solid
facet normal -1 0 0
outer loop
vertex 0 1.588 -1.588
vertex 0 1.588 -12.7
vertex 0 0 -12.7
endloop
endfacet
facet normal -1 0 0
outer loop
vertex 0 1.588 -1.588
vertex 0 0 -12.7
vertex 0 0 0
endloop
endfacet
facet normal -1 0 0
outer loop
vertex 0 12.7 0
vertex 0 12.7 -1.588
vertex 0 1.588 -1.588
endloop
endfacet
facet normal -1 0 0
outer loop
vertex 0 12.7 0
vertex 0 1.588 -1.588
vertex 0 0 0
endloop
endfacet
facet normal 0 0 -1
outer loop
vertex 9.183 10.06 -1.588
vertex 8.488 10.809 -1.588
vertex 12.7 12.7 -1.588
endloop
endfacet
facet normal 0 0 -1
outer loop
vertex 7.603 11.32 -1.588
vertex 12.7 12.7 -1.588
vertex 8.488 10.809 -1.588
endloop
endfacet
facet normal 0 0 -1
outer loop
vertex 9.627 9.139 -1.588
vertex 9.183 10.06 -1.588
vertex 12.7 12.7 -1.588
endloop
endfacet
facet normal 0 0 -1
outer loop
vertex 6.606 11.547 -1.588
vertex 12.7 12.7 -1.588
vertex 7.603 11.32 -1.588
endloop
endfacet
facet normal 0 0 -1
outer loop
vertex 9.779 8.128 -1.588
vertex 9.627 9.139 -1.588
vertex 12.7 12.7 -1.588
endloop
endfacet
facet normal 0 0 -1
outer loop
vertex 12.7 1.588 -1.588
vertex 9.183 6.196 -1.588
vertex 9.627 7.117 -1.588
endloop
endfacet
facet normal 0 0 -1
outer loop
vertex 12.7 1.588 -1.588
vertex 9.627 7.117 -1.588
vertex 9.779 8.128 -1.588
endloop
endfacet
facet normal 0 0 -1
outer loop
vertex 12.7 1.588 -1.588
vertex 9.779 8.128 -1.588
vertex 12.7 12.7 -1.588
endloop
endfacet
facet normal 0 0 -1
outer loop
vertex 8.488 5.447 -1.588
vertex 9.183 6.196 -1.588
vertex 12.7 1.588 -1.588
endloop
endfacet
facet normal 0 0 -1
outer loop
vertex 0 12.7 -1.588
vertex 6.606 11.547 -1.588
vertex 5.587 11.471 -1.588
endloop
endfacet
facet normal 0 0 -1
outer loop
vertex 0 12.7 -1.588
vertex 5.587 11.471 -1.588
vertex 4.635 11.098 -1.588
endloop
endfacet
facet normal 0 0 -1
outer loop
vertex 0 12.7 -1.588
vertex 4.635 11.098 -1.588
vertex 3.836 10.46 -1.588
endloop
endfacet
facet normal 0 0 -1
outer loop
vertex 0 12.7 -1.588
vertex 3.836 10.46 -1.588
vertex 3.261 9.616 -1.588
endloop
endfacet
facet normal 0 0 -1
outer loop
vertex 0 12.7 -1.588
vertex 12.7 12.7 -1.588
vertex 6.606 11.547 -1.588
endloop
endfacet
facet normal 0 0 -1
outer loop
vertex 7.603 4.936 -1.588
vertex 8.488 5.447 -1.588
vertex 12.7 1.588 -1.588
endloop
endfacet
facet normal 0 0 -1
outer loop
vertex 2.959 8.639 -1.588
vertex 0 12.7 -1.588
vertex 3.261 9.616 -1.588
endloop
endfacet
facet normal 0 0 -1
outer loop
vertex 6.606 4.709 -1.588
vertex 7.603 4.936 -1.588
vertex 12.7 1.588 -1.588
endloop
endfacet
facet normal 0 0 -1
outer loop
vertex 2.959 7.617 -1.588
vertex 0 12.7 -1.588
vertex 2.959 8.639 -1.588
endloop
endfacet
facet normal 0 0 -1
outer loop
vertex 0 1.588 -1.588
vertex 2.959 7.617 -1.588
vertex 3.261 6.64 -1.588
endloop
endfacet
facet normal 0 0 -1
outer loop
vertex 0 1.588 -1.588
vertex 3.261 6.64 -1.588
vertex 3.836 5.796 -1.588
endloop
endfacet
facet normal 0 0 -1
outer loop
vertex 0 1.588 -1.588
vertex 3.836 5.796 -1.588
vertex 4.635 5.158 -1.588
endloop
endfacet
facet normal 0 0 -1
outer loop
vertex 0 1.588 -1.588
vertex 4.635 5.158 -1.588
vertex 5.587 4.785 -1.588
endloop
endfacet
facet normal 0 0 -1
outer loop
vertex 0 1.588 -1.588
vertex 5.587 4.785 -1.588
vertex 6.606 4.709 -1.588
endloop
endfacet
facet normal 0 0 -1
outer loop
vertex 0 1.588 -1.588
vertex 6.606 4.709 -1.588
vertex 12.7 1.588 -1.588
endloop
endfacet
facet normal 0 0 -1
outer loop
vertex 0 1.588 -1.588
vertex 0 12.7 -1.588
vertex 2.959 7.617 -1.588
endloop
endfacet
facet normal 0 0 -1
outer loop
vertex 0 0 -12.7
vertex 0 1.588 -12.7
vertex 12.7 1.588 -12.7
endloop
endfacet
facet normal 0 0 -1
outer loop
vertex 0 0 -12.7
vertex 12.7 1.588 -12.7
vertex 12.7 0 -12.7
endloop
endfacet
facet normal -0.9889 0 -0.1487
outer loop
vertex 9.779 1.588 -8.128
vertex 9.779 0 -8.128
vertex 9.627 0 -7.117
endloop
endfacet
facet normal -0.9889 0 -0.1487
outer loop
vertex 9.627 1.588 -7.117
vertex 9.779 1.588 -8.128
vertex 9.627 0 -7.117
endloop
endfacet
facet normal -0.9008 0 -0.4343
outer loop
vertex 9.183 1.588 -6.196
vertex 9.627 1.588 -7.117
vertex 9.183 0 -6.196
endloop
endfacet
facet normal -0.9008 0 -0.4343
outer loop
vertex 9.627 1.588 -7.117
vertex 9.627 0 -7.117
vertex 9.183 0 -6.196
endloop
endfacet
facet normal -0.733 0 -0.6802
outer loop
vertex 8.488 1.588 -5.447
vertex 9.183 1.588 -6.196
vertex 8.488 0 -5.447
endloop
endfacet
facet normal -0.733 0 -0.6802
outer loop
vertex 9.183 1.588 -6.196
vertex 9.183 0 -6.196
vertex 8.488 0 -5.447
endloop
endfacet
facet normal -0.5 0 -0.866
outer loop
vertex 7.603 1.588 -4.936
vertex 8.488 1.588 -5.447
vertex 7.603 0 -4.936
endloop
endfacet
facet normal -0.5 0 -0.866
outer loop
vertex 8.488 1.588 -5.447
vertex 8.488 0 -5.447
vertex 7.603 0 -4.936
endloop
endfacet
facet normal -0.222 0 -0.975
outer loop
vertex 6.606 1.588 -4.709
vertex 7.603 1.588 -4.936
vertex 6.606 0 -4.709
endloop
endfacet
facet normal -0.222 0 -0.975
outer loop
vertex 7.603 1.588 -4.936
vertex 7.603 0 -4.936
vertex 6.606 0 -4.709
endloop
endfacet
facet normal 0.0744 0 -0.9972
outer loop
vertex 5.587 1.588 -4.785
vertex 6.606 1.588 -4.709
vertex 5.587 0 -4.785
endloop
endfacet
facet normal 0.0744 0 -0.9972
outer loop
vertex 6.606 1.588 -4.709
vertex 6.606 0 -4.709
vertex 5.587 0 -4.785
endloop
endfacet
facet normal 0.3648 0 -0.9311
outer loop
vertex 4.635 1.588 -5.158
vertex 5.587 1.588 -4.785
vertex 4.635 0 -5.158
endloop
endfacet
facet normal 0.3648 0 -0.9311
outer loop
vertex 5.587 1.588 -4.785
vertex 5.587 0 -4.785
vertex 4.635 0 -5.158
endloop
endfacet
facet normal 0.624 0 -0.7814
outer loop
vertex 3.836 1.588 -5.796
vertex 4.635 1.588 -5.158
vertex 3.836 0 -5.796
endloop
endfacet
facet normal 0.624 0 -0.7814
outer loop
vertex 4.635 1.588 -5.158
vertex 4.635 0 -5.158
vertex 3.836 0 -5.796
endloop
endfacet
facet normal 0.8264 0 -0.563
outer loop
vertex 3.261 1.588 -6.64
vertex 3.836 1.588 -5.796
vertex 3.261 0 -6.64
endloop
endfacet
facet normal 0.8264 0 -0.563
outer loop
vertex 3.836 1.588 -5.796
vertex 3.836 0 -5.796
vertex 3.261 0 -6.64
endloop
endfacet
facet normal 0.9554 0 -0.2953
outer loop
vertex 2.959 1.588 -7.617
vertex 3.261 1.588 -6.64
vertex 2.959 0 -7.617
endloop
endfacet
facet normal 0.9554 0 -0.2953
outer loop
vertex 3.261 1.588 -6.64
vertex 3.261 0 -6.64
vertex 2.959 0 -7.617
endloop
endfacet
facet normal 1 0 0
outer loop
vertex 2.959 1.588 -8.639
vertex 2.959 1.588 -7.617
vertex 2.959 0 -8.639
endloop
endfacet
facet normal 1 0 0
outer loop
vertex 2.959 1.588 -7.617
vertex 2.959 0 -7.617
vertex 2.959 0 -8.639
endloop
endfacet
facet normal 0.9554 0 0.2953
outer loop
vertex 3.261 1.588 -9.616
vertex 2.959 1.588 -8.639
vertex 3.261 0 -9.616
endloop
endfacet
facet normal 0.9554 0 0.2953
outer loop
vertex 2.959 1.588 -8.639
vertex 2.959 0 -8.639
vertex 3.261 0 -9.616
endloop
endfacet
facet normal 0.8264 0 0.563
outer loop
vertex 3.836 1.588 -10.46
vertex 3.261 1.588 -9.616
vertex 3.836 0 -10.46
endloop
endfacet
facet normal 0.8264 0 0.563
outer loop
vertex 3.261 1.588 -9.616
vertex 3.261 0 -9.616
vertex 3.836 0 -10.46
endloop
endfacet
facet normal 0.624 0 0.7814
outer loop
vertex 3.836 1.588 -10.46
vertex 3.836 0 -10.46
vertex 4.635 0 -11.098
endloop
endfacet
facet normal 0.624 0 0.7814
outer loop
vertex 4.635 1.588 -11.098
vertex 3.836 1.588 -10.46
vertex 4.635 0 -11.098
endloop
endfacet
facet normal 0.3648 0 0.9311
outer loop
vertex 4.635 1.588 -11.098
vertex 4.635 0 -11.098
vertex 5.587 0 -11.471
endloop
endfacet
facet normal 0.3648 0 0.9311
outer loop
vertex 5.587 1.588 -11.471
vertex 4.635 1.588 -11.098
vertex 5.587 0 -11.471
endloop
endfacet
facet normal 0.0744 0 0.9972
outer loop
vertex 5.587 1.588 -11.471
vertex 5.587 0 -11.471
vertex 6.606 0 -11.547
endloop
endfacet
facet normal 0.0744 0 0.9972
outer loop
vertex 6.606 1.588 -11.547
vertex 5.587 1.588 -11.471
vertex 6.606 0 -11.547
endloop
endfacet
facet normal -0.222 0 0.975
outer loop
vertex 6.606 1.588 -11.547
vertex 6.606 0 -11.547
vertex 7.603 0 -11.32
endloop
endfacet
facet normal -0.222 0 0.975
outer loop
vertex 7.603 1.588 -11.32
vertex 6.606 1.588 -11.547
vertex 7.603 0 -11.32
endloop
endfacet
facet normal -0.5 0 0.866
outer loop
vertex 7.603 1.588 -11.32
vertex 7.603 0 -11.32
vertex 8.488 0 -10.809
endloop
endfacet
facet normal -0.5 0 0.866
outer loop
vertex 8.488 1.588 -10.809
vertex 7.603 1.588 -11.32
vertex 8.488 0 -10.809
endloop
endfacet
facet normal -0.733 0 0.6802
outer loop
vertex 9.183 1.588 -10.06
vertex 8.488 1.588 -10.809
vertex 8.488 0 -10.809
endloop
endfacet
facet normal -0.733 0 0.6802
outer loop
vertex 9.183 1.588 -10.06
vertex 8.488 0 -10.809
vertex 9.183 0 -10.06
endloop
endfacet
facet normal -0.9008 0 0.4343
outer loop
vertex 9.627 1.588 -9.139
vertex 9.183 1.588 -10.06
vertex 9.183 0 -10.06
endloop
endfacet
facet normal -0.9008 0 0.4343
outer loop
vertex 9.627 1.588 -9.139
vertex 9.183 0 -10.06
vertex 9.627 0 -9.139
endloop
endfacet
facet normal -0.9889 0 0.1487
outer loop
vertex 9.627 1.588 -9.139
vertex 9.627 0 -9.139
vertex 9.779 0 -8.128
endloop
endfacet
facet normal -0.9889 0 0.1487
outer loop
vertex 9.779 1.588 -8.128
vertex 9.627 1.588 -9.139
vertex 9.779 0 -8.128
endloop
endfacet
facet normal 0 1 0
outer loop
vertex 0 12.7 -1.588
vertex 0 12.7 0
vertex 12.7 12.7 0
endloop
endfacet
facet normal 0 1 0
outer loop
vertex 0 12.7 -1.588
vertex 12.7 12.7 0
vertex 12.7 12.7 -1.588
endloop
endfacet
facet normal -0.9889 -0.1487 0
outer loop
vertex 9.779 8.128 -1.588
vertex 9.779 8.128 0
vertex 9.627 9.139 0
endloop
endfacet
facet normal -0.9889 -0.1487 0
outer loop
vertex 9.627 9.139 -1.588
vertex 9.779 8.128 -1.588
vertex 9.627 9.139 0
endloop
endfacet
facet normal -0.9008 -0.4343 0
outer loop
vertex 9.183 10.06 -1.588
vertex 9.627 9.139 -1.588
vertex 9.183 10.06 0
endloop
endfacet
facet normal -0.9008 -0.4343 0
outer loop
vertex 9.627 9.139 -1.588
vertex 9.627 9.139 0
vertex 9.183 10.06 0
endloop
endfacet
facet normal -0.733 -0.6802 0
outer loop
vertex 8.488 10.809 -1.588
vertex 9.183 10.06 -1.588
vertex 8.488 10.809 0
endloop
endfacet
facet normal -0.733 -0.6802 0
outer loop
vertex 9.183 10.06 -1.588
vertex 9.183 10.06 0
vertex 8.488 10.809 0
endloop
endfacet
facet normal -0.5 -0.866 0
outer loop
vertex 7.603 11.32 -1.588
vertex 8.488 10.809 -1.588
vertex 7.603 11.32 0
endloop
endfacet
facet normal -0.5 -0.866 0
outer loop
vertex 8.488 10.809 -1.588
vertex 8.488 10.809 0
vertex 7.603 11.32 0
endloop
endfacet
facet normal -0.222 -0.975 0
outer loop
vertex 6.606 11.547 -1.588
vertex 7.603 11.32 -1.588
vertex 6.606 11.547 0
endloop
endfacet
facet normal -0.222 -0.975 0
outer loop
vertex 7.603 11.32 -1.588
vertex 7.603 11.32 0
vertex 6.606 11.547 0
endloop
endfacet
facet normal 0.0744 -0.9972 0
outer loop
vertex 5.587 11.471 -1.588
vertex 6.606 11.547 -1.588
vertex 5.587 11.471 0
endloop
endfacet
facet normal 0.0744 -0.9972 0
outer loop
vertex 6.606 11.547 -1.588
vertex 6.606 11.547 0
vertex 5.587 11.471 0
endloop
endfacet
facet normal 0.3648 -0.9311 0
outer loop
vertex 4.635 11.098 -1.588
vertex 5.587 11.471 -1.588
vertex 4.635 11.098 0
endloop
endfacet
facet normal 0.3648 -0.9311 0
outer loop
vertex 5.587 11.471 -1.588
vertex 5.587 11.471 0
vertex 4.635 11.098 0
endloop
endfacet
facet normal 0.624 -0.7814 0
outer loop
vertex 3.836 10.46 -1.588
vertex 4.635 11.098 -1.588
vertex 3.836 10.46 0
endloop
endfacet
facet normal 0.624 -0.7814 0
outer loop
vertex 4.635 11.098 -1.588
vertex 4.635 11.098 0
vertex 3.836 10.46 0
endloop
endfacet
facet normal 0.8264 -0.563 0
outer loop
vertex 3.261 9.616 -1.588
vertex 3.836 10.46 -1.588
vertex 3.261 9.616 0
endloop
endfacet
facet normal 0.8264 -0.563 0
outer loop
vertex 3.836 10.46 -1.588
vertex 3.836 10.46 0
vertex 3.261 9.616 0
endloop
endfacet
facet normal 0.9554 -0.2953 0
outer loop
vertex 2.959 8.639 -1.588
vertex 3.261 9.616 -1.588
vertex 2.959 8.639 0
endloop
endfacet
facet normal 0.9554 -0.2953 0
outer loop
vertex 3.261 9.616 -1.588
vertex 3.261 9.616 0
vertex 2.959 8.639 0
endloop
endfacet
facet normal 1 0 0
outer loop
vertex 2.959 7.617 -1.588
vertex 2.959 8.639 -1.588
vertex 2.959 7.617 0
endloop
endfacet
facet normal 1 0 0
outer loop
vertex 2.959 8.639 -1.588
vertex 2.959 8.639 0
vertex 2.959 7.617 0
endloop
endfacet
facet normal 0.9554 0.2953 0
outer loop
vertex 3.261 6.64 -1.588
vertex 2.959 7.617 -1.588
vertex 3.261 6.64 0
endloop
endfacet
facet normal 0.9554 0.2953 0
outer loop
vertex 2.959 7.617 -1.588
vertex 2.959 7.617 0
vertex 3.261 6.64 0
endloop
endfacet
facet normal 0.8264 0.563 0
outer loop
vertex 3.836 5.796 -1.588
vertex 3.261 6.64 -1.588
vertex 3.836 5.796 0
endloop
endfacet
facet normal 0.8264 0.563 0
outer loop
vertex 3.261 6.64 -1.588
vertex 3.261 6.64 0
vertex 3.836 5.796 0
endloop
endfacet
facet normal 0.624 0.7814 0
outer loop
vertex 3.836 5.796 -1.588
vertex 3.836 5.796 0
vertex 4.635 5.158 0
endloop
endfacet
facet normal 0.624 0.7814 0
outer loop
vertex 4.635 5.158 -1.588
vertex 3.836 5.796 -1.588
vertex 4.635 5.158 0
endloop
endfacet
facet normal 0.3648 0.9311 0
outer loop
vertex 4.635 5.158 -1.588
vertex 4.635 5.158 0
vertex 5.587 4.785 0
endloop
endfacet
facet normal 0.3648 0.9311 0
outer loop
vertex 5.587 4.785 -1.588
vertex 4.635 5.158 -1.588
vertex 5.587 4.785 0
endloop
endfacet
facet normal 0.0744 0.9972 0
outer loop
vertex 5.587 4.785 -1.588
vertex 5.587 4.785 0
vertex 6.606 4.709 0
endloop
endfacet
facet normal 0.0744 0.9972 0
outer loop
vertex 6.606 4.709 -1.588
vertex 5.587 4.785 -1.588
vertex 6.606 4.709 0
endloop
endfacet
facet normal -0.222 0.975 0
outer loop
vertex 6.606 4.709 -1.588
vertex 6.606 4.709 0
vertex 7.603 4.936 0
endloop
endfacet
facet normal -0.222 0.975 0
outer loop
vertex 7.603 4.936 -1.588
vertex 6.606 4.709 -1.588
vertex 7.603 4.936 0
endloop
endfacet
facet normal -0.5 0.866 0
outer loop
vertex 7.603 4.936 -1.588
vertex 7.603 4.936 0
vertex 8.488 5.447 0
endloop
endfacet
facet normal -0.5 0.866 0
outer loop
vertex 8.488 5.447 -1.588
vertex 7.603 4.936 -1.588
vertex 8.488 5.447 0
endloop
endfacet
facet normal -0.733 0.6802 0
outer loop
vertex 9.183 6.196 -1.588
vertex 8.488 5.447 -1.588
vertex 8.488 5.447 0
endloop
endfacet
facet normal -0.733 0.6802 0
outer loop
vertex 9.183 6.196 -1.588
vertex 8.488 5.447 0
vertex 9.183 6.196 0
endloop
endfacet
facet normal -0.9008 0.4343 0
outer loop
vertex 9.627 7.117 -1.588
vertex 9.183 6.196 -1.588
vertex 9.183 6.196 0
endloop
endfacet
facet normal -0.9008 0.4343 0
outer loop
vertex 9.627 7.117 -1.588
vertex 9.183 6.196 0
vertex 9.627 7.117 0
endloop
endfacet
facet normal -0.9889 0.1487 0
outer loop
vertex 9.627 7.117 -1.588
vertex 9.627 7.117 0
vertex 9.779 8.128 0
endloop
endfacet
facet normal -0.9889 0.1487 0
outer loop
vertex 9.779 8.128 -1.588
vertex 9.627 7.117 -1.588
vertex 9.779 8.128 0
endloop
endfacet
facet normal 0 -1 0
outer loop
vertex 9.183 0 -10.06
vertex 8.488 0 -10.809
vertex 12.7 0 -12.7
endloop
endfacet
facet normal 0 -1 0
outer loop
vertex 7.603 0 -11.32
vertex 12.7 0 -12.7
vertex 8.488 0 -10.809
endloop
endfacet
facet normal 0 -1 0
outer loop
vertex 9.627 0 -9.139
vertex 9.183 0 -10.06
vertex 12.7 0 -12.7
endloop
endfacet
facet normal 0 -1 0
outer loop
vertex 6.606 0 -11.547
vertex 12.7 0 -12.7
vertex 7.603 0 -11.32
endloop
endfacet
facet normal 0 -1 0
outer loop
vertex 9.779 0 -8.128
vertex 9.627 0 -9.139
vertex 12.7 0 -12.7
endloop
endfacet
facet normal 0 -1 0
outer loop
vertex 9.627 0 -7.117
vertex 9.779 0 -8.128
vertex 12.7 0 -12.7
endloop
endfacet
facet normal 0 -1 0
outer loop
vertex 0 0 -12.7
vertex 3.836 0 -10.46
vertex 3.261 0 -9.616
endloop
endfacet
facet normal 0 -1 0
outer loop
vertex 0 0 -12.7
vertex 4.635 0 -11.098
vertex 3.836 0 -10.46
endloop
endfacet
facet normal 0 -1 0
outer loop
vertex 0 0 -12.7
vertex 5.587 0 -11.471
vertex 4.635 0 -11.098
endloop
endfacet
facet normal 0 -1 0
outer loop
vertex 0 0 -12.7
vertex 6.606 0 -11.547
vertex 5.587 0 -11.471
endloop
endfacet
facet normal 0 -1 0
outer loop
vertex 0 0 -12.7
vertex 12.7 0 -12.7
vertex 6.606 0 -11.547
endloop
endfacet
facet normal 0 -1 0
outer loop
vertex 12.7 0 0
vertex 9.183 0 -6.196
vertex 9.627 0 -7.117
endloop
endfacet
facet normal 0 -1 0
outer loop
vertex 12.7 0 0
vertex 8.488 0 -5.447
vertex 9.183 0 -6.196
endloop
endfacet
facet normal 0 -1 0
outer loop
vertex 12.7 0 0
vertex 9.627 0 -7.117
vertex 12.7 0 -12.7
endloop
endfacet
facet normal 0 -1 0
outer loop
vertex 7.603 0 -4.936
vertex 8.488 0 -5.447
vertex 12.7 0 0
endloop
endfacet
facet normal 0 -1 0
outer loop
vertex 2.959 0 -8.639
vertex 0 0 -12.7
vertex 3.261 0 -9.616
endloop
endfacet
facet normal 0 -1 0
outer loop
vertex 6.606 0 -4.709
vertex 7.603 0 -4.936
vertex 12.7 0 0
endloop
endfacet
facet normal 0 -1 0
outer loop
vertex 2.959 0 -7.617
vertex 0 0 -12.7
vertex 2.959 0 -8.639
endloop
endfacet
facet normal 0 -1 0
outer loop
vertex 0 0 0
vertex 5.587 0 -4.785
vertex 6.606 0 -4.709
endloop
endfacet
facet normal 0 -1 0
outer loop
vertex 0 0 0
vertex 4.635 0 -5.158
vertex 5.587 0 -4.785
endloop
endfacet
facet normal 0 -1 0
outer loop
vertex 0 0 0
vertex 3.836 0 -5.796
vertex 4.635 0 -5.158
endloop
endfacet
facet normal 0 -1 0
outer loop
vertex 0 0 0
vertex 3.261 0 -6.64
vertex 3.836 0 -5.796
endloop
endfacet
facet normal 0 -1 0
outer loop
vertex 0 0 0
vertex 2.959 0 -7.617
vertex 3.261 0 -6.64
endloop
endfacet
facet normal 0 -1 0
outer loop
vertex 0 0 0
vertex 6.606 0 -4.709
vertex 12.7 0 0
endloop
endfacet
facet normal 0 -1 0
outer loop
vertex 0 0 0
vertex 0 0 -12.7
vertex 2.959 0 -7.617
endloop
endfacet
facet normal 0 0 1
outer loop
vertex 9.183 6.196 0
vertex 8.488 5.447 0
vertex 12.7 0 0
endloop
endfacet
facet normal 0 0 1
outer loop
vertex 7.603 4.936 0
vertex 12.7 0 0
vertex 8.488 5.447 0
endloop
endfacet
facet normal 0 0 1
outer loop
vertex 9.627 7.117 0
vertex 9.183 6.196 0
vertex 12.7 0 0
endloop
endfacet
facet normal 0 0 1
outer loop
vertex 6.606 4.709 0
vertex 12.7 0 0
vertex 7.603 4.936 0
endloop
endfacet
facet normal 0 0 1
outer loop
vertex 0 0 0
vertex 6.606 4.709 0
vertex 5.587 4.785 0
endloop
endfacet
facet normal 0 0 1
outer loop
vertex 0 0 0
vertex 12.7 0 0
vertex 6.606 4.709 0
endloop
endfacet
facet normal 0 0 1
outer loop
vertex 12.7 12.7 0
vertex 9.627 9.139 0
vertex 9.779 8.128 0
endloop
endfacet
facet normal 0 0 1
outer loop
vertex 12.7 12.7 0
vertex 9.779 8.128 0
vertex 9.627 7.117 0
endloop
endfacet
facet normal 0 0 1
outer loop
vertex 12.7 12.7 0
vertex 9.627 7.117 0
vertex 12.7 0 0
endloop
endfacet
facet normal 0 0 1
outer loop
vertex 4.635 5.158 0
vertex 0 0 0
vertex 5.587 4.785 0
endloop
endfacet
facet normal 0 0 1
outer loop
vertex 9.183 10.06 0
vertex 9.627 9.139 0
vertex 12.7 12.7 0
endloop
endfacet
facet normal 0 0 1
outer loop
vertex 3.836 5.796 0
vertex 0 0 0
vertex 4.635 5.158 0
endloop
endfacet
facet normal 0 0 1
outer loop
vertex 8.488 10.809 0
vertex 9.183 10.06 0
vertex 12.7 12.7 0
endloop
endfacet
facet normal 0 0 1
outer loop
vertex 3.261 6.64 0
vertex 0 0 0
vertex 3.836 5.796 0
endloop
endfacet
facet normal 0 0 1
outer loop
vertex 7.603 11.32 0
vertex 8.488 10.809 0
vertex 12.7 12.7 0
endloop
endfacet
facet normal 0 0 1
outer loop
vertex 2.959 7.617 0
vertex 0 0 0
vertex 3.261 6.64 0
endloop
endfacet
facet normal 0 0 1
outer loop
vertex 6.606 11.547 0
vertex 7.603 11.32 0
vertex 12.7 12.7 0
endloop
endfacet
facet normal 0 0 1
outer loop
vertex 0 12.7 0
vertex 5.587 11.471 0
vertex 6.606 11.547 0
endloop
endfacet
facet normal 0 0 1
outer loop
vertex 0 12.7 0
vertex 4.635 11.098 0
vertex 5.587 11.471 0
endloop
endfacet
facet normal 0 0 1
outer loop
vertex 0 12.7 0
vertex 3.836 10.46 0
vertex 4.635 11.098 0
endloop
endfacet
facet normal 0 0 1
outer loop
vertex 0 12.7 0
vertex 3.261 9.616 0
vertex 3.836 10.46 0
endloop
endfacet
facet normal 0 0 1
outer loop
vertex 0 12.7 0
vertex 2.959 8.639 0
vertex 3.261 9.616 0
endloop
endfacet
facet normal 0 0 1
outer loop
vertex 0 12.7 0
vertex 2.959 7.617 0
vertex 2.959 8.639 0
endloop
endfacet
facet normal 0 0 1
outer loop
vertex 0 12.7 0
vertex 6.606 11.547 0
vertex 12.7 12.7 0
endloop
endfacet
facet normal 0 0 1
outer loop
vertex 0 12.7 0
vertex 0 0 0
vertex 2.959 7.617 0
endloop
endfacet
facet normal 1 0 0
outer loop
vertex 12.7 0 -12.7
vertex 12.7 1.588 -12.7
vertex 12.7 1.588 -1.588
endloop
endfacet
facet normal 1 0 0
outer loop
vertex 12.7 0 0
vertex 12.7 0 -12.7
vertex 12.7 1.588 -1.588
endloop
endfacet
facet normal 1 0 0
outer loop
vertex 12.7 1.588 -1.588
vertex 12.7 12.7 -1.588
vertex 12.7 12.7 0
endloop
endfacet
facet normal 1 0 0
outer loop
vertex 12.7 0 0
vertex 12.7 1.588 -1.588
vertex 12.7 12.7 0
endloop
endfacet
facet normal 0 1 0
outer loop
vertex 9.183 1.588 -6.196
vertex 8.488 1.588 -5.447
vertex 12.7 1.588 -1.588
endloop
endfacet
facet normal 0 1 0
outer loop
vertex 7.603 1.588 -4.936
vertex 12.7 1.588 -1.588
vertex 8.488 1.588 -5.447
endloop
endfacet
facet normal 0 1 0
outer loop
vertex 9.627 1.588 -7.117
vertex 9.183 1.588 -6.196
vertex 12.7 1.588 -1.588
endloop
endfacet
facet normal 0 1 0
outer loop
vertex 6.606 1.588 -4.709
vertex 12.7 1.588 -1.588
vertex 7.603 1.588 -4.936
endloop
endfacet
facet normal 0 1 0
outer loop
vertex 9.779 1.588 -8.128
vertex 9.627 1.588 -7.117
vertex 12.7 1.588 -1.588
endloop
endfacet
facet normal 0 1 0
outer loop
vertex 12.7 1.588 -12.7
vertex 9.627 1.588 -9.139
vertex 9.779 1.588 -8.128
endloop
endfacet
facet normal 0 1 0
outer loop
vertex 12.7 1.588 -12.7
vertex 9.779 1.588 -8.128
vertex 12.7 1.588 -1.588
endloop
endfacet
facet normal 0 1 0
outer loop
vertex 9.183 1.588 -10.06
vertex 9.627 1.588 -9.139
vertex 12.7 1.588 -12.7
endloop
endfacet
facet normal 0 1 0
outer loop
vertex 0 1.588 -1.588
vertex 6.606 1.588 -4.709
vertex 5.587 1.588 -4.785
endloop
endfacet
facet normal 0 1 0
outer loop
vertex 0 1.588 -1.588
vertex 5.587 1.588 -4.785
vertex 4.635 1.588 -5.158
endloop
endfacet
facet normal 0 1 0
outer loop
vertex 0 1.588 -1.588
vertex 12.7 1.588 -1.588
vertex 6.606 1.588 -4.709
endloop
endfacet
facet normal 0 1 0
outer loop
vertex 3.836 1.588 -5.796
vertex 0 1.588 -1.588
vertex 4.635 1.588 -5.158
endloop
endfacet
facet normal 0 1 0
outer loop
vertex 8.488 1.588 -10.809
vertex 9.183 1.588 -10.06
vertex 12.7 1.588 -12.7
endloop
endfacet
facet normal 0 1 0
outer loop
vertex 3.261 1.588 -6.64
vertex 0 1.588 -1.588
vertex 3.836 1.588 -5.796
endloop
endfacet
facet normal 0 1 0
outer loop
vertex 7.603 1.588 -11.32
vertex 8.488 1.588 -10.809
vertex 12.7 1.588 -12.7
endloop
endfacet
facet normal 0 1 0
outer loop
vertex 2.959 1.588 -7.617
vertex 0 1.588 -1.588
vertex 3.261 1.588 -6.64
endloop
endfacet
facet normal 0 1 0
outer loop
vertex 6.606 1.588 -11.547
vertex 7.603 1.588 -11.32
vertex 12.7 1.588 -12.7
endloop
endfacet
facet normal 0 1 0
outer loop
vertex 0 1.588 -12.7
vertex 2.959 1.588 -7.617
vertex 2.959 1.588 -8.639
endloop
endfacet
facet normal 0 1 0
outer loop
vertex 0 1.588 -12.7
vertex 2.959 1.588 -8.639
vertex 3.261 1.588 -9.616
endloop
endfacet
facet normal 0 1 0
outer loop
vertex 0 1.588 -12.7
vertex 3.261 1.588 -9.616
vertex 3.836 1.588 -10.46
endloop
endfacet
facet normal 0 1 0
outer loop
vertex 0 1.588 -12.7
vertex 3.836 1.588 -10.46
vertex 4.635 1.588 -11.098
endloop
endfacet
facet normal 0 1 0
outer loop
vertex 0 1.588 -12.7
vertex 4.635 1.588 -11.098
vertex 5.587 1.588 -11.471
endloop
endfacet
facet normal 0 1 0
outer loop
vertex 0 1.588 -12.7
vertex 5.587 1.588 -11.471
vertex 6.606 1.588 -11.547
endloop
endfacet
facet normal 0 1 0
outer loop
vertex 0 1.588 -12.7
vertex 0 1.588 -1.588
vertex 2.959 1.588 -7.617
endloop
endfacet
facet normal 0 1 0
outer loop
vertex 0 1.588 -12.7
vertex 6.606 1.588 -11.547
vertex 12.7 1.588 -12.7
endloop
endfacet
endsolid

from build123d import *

# Parameters (mm, degrees)
BOSS_EXTRUDE1_DEPTH = 12.7
SKETCH2_R           = 3.429
CUT_EXTRUDE1_DEPTH  = 13.7
SKETCH3_R           = 3.429
CUT_EXTRUDE2_DEPTH  = 13.7


with BuildPart() as part:
    # Sketch1 → Boss-Extrude1 (new body)
    with BuildSketch(Plane(origin=(0, 0, 0), x_dir=(0, 0, -1), z_dir=(1, 0, 0))):
        Polygon((0, 0), (0, 12.7), (1.5875, 12.7), (1.5875, 1.5875), (12.7, 1.5875), (12.7, 0), align=None)
    extrude(amount=BOSS_EXTRUDE1_DEPTH)

    # Sketch2 → Cut-Extrude1 (cut, through all)
    with BuildSketch(Plane.XY):
        with Locations((6.35, 8.128)):
            Circle(SKETCH2_R)
    extrude(amount=-CUT_EXTRUDE1_DEPTH, mode=Mode.SUBTRACT)

    # Sketch3 → Cut-Extrude2 (cut, through all)
    with BuildSketch(Plane.XZ):
        with Locations((6.35, -8.128)):
            Circle(SKETCH3_R)
    extrude(amount=-CUT_EXTRUDE2_DEPTH, mode=Mode.SUBTRACT)


solid = part.part
